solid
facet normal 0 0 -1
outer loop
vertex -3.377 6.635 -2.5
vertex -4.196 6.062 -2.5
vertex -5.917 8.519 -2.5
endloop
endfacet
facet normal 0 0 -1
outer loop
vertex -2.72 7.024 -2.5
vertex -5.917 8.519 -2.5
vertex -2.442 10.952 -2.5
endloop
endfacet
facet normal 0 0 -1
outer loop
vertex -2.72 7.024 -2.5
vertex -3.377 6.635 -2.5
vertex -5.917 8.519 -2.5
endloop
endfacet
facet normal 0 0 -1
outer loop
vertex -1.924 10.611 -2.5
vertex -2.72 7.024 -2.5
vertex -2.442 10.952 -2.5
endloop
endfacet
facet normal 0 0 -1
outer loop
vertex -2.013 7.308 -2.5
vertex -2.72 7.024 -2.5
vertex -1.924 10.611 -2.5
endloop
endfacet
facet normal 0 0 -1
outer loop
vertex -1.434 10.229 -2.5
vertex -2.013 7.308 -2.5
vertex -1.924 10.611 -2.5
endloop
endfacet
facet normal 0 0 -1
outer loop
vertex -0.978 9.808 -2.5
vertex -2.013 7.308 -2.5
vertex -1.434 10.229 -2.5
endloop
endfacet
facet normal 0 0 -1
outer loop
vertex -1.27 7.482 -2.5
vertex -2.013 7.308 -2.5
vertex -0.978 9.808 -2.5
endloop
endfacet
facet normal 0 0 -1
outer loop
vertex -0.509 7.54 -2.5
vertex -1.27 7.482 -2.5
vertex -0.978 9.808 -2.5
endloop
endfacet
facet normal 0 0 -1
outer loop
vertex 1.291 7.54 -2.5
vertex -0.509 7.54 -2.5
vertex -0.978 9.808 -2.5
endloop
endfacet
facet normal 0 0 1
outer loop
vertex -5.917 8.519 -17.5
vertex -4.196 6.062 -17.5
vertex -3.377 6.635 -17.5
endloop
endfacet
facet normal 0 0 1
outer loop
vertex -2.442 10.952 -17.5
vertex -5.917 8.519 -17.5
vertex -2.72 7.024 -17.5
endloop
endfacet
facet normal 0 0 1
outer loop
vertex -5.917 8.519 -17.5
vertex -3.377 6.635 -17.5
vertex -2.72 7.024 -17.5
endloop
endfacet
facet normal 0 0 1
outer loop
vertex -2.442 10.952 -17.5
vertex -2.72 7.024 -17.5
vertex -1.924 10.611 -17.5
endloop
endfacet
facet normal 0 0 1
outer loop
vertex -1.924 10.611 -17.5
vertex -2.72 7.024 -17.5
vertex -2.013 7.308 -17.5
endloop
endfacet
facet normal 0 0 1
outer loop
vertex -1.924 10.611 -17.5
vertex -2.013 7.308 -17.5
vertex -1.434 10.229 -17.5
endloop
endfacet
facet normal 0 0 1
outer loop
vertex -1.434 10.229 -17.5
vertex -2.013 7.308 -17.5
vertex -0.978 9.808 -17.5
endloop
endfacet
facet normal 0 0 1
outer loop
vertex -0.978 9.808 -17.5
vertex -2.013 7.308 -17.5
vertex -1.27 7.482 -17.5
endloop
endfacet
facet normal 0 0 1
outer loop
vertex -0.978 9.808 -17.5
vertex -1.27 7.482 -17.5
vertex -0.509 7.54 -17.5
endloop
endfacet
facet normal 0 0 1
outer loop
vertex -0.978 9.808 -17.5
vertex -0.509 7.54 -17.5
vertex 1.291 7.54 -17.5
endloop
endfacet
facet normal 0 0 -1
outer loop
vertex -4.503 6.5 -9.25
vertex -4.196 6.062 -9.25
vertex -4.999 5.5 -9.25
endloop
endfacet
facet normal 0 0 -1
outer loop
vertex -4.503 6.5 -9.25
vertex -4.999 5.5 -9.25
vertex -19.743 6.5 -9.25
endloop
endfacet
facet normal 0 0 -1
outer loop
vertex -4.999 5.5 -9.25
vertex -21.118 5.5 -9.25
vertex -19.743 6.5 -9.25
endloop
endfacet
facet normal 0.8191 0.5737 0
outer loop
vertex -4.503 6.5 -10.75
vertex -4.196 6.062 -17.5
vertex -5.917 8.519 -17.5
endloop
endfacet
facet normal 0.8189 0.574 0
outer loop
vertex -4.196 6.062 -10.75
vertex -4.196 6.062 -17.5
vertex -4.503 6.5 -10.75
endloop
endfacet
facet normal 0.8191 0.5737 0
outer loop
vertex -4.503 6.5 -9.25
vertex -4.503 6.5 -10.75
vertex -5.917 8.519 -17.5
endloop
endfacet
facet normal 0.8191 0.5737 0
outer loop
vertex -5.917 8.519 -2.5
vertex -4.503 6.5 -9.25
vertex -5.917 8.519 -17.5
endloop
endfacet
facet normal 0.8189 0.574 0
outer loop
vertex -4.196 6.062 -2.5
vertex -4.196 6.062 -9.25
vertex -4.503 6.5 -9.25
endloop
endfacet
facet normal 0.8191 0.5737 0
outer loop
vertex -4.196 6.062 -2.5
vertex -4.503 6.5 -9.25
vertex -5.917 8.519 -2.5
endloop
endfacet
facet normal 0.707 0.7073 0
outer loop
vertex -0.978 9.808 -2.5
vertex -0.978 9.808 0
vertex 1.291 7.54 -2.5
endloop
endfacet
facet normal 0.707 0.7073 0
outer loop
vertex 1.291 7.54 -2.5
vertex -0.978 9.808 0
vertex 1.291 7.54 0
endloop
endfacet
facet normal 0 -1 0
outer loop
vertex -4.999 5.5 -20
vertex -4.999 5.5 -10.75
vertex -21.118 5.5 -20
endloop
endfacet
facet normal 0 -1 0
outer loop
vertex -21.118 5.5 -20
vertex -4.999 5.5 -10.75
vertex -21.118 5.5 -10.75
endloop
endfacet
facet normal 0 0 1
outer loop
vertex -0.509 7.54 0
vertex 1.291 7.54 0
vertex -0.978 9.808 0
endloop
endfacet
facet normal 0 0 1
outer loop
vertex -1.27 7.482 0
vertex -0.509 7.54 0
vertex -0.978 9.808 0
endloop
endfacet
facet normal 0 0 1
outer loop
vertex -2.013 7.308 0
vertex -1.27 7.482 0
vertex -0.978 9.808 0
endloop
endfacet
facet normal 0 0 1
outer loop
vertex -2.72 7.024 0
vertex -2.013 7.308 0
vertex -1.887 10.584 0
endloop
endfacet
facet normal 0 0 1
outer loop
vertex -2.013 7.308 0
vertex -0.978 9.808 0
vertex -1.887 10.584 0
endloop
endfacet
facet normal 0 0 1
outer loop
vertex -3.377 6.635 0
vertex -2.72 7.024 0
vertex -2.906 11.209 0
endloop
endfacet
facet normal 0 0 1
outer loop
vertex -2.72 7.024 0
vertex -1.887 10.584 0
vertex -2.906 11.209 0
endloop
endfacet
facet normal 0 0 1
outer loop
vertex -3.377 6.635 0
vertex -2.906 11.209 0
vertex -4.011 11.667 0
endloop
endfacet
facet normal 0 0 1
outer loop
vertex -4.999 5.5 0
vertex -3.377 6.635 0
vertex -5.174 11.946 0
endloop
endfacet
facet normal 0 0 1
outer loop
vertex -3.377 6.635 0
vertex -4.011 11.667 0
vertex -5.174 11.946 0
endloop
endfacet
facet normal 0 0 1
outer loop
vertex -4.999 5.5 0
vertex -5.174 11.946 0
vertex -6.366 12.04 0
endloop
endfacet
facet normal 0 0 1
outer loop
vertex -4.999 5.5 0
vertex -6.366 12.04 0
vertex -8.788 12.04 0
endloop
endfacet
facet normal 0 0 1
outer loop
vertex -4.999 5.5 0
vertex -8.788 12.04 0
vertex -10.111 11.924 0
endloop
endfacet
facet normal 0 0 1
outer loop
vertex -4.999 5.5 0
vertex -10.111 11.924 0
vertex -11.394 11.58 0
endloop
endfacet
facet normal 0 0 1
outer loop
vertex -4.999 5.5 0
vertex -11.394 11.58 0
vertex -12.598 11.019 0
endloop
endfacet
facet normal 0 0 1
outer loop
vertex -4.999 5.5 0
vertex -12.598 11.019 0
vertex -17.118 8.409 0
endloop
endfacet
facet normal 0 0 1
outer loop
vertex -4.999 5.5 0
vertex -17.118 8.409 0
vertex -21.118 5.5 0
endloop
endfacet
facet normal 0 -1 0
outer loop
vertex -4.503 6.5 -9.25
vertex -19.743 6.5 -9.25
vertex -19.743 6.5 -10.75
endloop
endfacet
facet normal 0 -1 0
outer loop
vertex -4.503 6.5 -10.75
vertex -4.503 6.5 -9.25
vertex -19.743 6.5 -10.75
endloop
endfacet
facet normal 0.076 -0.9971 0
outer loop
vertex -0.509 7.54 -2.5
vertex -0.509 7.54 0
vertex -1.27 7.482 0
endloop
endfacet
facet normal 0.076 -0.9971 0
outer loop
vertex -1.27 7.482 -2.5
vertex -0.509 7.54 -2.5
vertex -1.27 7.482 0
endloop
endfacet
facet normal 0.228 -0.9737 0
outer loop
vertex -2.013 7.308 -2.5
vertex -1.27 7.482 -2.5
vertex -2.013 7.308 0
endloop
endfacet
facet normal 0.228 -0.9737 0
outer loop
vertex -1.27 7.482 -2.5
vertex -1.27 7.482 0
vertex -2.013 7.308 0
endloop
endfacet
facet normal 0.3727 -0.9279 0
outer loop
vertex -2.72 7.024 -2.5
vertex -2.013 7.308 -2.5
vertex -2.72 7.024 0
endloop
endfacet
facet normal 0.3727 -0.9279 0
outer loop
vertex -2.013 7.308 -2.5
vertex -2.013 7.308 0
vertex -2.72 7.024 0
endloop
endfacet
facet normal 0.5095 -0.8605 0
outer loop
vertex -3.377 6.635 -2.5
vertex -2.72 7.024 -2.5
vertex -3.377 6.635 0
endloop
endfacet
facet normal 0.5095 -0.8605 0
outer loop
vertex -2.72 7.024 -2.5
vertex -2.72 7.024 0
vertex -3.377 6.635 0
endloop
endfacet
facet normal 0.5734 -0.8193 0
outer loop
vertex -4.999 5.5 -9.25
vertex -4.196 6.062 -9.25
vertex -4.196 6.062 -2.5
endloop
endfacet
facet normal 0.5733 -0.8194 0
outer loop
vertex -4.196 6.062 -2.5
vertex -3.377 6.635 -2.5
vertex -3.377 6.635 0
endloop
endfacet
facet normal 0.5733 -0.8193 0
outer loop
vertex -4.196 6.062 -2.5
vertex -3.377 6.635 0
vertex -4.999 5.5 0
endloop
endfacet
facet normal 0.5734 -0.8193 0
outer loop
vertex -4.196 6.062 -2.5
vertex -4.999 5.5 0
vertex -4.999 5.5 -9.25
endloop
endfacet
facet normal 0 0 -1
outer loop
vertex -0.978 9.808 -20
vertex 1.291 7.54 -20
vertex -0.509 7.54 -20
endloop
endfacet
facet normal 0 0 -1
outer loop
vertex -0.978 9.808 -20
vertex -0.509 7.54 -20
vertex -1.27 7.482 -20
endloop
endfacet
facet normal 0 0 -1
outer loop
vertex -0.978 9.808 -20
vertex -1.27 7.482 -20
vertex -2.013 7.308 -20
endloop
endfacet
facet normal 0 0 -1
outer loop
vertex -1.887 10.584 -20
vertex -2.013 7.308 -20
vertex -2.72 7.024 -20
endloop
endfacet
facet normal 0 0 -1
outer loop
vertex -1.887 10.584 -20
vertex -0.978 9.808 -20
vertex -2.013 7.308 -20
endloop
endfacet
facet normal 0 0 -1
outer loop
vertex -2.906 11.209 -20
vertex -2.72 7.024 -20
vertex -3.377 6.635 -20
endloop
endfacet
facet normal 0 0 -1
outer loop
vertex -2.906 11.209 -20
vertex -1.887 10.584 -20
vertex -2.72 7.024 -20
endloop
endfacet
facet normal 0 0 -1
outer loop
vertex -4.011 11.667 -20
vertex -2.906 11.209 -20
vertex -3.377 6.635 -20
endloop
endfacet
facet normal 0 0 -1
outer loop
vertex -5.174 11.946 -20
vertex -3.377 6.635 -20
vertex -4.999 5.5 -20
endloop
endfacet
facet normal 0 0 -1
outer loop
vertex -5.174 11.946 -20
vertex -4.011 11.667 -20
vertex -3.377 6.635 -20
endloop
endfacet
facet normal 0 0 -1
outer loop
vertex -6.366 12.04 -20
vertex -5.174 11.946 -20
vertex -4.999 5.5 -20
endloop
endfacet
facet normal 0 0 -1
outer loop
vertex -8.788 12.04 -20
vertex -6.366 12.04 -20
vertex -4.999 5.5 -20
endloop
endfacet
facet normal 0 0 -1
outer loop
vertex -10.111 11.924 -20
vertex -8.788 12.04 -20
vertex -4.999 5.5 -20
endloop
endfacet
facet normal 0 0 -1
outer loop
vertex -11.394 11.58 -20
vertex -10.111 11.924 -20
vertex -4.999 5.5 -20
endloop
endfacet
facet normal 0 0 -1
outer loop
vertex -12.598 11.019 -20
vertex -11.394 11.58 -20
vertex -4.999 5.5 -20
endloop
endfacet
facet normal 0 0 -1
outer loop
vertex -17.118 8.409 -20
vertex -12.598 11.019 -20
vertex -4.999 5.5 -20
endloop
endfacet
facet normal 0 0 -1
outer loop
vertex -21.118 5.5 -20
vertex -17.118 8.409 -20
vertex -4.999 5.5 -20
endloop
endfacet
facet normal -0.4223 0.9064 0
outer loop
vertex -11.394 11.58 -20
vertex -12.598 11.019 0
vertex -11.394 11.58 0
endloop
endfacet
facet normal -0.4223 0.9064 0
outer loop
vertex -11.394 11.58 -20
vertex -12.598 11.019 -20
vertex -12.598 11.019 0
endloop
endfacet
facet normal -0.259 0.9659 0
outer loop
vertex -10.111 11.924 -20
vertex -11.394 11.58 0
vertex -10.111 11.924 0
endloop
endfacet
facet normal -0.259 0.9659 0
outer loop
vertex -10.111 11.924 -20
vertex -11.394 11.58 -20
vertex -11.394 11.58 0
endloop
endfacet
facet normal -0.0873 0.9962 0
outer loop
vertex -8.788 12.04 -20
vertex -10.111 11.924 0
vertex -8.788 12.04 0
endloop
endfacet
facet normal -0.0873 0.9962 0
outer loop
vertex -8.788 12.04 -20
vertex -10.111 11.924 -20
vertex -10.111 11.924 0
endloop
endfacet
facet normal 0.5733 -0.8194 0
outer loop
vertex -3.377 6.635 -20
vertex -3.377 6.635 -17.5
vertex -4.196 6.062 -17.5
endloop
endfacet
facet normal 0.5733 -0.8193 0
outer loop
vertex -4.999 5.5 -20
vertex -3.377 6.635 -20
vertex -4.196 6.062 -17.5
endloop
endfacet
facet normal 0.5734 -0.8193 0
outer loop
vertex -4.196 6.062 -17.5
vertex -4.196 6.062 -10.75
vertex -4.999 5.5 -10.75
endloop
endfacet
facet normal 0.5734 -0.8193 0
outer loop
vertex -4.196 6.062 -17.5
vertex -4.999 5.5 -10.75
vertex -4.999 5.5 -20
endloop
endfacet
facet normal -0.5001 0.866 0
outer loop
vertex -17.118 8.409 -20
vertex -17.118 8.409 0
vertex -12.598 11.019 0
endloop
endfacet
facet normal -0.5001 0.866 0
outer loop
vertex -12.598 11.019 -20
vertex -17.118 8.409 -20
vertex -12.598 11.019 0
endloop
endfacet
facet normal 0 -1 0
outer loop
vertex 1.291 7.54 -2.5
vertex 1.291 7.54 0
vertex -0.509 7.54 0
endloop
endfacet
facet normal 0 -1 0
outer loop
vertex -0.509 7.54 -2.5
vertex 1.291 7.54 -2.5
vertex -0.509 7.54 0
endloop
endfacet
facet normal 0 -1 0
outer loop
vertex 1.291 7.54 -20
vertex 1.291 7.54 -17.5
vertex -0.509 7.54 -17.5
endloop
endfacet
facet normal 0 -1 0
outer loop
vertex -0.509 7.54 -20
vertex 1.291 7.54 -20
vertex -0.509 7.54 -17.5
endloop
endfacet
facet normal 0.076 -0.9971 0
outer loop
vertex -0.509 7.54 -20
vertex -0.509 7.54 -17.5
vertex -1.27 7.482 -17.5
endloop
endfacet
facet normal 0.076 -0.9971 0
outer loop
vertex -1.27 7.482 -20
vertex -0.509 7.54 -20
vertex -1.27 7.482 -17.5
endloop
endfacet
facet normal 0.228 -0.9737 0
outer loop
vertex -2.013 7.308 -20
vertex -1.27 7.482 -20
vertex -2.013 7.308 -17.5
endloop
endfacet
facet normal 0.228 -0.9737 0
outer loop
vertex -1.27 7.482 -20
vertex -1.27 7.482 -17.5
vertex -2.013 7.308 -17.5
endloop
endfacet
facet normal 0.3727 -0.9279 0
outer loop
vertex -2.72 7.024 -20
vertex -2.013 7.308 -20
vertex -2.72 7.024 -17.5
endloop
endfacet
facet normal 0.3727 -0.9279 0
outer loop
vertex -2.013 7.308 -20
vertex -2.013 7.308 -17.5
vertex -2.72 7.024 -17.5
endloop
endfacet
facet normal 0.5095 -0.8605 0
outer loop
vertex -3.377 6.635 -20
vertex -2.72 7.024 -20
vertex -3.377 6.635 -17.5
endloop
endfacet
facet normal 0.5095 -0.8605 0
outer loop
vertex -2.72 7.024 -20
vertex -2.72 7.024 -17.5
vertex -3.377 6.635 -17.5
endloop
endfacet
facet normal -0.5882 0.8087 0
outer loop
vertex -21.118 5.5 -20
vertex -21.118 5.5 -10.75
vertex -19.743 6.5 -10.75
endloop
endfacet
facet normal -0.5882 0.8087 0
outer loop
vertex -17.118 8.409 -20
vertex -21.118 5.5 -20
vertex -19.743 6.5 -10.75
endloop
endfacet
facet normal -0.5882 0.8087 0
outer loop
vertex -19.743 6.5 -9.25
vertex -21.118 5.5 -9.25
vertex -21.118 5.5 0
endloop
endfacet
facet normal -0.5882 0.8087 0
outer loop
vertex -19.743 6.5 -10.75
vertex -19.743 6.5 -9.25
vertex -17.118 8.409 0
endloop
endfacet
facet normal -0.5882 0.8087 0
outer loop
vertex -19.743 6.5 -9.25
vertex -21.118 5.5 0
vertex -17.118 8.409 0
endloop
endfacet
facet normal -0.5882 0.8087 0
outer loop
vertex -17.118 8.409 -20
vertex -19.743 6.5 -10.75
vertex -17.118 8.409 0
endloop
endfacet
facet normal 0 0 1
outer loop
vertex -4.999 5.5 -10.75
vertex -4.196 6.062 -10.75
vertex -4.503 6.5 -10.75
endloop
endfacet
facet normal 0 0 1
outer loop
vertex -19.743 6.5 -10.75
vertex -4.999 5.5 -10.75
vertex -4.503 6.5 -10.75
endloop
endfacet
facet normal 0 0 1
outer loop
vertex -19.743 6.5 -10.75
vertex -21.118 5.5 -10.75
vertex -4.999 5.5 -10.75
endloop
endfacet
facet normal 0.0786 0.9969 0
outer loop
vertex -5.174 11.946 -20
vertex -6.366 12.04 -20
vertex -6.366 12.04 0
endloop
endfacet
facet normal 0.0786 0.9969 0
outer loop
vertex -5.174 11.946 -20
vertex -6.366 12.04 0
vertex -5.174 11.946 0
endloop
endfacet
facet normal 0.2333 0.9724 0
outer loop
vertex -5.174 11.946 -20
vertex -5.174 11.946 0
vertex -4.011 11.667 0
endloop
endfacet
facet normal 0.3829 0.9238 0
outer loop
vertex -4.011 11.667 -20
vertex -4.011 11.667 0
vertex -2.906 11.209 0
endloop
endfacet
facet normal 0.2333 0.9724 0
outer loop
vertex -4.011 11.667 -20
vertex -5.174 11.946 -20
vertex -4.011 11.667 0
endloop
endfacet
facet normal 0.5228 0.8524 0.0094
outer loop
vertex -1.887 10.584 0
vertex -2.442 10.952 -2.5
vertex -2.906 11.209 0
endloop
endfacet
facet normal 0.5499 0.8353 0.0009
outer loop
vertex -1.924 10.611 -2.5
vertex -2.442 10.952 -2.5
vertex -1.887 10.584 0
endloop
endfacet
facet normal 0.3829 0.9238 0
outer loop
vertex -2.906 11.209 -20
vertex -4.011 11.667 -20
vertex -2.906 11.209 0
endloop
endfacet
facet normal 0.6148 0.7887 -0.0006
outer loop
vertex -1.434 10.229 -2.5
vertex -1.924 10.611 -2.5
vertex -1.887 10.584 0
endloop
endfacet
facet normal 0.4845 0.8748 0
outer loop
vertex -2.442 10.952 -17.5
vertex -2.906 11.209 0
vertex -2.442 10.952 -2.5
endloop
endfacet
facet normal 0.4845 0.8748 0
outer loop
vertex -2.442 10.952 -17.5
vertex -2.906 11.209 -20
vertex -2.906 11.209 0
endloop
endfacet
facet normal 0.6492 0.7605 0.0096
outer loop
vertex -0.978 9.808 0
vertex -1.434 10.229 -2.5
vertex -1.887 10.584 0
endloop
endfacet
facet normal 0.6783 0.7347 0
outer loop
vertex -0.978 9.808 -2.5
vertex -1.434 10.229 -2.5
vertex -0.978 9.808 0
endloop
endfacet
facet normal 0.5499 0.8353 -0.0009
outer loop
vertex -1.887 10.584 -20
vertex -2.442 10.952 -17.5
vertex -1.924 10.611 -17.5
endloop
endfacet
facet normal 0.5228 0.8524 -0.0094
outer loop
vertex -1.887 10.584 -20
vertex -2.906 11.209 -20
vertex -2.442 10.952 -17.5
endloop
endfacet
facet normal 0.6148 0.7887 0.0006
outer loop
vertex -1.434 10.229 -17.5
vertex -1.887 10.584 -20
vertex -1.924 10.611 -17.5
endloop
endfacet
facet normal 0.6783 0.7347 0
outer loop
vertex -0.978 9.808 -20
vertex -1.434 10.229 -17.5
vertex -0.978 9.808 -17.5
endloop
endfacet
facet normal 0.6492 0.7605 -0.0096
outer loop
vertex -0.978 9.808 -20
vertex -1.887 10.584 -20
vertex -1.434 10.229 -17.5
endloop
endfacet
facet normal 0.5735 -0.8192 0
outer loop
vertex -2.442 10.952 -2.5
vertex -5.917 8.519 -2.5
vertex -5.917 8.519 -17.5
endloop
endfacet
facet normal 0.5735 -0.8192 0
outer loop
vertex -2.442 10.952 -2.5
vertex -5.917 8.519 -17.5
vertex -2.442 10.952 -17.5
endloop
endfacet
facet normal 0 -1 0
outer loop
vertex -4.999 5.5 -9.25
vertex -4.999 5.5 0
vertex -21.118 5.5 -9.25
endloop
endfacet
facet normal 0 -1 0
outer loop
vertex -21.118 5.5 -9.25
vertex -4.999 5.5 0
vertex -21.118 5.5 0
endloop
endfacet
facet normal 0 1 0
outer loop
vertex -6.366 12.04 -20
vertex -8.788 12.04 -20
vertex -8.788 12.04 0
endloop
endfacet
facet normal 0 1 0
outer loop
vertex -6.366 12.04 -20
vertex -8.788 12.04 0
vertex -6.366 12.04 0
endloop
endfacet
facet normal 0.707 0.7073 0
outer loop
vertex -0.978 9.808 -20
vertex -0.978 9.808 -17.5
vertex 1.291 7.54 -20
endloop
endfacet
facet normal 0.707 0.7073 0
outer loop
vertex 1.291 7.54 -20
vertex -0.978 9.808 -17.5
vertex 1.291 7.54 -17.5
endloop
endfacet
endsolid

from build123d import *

# Parameters (mm, degrees)
BOSS_EXTRUDE1_DEPTH     = 20
FILLET1_R               = 7.62
SKETCH2_W               = 14.64163524
SKETCH2_H               = 15
CUT_EXTRUDE3_DEPTH      = 4.607313514
CUT_EXTRUDE3_DEPTH_BACK = 3
SKETCH3_W               = 1.5
SKETCH3_H               = 1
CUT_EXTRUDE4_DEPTH      = 22.118365096


with BuildPart() as part:
    # Sketch1 → Boss-Extrude1 (new body)
    with BuildSketch(Plane.XY):
        with BuildLine():
            Line((-21.118365096, 5.5), (-17.118365096, 8.408769901))
            Line((-17.118365096, 8.408769901), (-10.829358836, 12.039729358))
            Line((-10.829358836, 12.039729358), (-3.209358836, 12.039729358))
            Line((-3.209358836, 12.039729358), (1.290641164, 7.539729358))
            Line((1.290641164, 7.539729358), (-0.508988662, 7.539729358))
            ThreePointArc((-0.508988662, 7.539729358), (-2.01251766, 7.308314112), (-3.376870844, 6.635489579))
            Line((-3.376870844, 6.635489579), (-4.998518024, 5.5))
            Line((-4.998518024, 5.5), (-21.118365096, 5.5))
        make_face()
    extrude(amount=-BOSS_EXTRUDE1_DEPTH)

    # Fillet1
    fillet1_edges = [part.edges().sort_by_distance(p)[0] for p in [
        (-3.209358836, 12.039729358, -10),
        (-10.829358836, 12.039729358, -10),
    ]]
    fillet(fillet1_edges, radius=FILLET1_R)

    # Sketch2 → Cut-Extrude3 (cut, two sides)
    with BuildSketch(Plane(origin=(-4.228616794, 6.039090645, 0), x_dir=(0.819152044, 0.573576436, 0), z_dir=(0.573576436, -0.819152044, 0))) as cut_extrude3_sk:
        with Locations((7.360607431, -10)):
            Rectangle(SKETCH2_W, SKETCH2_H)
    extrude(amount=CUT_EXTRUDE3_DEPTH, mode=Mode.SUBTRACT)
    extrude(cut_extrude3_sk.sketch, amount=-CUT_EXTRUDE3_DEPTH_BACK, mode=Mode.SUBTRACT)

    # Sketch3 → Cut-Extrude4 (cut, through all)
    with BuildSketch(Plane(origin=(0, 0, 0), x_dir=(0, 0, -1), z_dir=(1, 0, 0))):
        with Locations((10, 6)):
            Rectangle(SKETCH3_W, SKETCH3_H)
    extrude(amount=-CUT_EXTRUDE4_DEPTH, mode=Mode.SUBTRACT)


solid = part.part
